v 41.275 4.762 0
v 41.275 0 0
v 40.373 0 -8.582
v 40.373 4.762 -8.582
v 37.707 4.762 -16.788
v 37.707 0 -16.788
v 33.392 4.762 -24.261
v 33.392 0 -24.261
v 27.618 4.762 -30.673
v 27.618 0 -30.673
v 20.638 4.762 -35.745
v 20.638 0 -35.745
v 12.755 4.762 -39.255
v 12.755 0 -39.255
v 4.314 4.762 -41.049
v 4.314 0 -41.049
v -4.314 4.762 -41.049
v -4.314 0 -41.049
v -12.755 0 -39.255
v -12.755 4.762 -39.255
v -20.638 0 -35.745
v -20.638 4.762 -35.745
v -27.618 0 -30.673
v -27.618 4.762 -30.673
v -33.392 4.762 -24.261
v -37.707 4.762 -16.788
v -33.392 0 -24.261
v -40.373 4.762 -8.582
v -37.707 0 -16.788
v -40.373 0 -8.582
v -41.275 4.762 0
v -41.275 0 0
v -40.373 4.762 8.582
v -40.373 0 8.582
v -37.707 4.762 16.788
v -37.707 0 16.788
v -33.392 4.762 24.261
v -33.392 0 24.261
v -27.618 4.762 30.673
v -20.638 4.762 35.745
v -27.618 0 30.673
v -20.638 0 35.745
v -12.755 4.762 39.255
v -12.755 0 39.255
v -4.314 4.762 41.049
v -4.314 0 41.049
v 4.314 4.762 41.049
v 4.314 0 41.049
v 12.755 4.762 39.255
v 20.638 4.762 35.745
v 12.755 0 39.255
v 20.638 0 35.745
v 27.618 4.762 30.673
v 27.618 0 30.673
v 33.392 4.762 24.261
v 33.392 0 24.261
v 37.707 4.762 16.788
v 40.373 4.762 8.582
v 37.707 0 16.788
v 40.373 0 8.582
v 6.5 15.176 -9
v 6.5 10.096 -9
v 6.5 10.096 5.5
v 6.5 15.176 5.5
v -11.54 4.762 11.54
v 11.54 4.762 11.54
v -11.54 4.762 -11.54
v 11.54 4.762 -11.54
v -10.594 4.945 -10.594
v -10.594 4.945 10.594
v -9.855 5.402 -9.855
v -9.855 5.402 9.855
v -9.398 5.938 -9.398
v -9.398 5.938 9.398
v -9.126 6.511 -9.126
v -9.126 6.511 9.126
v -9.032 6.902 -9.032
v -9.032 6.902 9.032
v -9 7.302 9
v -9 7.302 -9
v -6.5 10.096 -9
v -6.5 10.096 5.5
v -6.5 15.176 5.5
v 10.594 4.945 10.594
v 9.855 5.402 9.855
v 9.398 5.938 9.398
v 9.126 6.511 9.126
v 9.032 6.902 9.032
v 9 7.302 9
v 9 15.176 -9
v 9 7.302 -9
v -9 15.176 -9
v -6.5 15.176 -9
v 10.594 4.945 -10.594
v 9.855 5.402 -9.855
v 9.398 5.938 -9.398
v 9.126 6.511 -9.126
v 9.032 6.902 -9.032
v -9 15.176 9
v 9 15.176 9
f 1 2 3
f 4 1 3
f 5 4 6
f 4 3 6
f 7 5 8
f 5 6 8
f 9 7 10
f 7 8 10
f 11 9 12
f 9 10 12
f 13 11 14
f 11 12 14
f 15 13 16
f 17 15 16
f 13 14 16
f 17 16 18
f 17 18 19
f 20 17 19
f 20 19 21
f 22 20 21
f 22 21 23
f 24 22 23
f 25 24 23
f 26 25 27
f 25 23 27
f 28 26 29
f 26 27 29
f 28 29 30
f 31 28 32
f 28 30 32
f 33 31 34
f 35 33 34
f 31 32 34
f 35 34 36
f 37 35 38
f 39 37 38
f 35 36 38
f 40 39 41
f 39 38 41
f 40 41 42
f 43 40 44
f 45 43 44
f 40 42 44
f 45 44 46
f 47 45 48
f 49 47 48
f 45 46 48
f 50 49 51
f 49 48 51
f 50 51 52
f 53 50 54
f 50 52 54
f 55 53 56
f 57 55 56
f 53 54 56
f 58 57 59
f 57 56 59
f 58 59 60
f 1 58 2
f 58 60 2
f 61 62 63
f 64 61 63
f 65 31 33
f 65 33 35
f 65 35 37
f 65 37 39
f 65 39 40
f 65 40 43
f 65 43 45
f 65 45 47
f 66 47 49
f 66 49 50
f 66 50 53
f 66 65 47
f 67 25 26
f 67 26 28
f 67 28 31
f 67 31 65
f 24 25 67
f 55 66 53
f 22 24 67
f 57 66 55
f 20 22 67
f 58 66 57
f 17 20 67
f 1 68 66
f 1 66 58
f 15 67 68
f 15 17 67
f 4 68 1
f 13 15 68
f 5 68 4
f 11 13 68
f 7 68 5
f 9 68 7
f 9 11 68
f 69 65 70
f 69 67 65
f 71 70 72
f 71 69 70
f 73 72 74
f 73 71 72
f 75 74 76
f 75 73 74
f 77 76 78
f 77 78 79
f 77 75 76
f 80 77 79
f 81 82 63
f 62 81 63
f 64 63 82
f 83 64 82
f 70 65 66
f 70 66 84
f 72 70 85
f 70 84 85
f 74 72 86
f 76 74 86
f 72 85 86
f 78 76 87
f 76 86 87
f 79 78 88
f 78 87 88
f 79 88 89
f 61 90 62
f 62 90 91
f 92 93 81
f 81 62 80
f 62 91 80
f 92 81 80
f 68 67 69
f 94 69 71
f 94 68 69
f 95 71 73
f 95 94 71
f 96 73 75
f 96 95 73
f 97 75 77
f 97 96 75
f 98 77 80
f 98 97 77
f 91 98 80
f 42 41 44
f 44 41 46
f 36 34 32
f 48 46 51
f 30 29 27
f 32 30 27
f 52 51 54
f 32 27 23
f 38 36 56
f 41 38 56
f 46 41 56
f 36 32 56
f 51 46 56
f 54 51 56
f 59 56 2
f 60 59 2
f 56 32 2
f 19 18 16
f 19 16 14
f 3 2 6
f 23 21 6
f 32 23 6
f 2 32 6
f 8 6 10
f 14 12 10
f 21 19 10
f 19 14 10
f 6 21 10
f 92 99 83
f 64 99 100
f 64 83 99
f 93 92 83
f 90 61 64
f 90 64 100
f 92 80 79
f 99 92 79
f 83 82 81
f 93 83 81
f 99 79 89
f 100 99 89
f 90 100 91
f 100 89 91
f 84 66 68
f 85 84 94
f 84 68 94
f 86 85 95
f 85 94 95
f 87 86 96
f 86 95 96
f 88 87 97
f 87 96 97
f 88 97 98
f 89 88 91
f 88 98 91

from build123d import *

# Parameters (mm, degrees)
SKETCH1_R           = 41.275
BOSS_EXTRUDE1_DEPTH = 4.7625
SKETCH2_W           = 18
SKETCH2_H           = 18
BOSS_EXTRUDE2_DEPTH = 5.334
FILLET1_R           = 2.54
BOSS_EXTRUDE3_DEPTH = 5.08


with BuildPart() as part:
    # Sketch1 → Boss-Extrude1 (new body)
    with BuildSketch(Plane(origin=(0, 0, 0), x_dir=(1, 0, 0), z_dir=(0, 1, 0))):
        Circle(SKETCH1_R)
    extrude(amount=BOSS_EXTRUDE1_DEPTH)

    # Sketch2 → Boss-Extrude2 (add)
    with BuildSketch(Plane(origin=(0, 4.7625, 0), x_dir=(1, 0, 0), z_dir=(0, 1, 0))):
        Rectangle(SKETCH2_W, SKETCH2_H)
    extrude(amount=BOSS_EXTRUDE2_DEPTH)

    # Fillet1
    fillet1_edges = [part.edges().sort_by_distance(p)[0] for p in [
        (9, 4.7625, 0),
        (0, 4.7625, -9),
        (-9, 4.7625, 0),
        (0, 4.7625, 9),
    ]]
    fillet(fillet1_edges, radius=FILLET1_R)

    # Sketch3 → Boss-Extrude3 (add)
    with BuildSketch(Plane(origin=(0, 10.0965, 0), x_dir=(1, 0, 0), z_dir=(0, 1, 0))):
        Polygon((-9, -9), (9, -9), (9, 9), (6.5, 9), (6.5, -5.5), (-6.5, -5.5), (-6.5, 9), (-9, 9), align=None)
    extrude(amount=BOSS_EXTRUDE3_DEPTH)


solid = part.part
